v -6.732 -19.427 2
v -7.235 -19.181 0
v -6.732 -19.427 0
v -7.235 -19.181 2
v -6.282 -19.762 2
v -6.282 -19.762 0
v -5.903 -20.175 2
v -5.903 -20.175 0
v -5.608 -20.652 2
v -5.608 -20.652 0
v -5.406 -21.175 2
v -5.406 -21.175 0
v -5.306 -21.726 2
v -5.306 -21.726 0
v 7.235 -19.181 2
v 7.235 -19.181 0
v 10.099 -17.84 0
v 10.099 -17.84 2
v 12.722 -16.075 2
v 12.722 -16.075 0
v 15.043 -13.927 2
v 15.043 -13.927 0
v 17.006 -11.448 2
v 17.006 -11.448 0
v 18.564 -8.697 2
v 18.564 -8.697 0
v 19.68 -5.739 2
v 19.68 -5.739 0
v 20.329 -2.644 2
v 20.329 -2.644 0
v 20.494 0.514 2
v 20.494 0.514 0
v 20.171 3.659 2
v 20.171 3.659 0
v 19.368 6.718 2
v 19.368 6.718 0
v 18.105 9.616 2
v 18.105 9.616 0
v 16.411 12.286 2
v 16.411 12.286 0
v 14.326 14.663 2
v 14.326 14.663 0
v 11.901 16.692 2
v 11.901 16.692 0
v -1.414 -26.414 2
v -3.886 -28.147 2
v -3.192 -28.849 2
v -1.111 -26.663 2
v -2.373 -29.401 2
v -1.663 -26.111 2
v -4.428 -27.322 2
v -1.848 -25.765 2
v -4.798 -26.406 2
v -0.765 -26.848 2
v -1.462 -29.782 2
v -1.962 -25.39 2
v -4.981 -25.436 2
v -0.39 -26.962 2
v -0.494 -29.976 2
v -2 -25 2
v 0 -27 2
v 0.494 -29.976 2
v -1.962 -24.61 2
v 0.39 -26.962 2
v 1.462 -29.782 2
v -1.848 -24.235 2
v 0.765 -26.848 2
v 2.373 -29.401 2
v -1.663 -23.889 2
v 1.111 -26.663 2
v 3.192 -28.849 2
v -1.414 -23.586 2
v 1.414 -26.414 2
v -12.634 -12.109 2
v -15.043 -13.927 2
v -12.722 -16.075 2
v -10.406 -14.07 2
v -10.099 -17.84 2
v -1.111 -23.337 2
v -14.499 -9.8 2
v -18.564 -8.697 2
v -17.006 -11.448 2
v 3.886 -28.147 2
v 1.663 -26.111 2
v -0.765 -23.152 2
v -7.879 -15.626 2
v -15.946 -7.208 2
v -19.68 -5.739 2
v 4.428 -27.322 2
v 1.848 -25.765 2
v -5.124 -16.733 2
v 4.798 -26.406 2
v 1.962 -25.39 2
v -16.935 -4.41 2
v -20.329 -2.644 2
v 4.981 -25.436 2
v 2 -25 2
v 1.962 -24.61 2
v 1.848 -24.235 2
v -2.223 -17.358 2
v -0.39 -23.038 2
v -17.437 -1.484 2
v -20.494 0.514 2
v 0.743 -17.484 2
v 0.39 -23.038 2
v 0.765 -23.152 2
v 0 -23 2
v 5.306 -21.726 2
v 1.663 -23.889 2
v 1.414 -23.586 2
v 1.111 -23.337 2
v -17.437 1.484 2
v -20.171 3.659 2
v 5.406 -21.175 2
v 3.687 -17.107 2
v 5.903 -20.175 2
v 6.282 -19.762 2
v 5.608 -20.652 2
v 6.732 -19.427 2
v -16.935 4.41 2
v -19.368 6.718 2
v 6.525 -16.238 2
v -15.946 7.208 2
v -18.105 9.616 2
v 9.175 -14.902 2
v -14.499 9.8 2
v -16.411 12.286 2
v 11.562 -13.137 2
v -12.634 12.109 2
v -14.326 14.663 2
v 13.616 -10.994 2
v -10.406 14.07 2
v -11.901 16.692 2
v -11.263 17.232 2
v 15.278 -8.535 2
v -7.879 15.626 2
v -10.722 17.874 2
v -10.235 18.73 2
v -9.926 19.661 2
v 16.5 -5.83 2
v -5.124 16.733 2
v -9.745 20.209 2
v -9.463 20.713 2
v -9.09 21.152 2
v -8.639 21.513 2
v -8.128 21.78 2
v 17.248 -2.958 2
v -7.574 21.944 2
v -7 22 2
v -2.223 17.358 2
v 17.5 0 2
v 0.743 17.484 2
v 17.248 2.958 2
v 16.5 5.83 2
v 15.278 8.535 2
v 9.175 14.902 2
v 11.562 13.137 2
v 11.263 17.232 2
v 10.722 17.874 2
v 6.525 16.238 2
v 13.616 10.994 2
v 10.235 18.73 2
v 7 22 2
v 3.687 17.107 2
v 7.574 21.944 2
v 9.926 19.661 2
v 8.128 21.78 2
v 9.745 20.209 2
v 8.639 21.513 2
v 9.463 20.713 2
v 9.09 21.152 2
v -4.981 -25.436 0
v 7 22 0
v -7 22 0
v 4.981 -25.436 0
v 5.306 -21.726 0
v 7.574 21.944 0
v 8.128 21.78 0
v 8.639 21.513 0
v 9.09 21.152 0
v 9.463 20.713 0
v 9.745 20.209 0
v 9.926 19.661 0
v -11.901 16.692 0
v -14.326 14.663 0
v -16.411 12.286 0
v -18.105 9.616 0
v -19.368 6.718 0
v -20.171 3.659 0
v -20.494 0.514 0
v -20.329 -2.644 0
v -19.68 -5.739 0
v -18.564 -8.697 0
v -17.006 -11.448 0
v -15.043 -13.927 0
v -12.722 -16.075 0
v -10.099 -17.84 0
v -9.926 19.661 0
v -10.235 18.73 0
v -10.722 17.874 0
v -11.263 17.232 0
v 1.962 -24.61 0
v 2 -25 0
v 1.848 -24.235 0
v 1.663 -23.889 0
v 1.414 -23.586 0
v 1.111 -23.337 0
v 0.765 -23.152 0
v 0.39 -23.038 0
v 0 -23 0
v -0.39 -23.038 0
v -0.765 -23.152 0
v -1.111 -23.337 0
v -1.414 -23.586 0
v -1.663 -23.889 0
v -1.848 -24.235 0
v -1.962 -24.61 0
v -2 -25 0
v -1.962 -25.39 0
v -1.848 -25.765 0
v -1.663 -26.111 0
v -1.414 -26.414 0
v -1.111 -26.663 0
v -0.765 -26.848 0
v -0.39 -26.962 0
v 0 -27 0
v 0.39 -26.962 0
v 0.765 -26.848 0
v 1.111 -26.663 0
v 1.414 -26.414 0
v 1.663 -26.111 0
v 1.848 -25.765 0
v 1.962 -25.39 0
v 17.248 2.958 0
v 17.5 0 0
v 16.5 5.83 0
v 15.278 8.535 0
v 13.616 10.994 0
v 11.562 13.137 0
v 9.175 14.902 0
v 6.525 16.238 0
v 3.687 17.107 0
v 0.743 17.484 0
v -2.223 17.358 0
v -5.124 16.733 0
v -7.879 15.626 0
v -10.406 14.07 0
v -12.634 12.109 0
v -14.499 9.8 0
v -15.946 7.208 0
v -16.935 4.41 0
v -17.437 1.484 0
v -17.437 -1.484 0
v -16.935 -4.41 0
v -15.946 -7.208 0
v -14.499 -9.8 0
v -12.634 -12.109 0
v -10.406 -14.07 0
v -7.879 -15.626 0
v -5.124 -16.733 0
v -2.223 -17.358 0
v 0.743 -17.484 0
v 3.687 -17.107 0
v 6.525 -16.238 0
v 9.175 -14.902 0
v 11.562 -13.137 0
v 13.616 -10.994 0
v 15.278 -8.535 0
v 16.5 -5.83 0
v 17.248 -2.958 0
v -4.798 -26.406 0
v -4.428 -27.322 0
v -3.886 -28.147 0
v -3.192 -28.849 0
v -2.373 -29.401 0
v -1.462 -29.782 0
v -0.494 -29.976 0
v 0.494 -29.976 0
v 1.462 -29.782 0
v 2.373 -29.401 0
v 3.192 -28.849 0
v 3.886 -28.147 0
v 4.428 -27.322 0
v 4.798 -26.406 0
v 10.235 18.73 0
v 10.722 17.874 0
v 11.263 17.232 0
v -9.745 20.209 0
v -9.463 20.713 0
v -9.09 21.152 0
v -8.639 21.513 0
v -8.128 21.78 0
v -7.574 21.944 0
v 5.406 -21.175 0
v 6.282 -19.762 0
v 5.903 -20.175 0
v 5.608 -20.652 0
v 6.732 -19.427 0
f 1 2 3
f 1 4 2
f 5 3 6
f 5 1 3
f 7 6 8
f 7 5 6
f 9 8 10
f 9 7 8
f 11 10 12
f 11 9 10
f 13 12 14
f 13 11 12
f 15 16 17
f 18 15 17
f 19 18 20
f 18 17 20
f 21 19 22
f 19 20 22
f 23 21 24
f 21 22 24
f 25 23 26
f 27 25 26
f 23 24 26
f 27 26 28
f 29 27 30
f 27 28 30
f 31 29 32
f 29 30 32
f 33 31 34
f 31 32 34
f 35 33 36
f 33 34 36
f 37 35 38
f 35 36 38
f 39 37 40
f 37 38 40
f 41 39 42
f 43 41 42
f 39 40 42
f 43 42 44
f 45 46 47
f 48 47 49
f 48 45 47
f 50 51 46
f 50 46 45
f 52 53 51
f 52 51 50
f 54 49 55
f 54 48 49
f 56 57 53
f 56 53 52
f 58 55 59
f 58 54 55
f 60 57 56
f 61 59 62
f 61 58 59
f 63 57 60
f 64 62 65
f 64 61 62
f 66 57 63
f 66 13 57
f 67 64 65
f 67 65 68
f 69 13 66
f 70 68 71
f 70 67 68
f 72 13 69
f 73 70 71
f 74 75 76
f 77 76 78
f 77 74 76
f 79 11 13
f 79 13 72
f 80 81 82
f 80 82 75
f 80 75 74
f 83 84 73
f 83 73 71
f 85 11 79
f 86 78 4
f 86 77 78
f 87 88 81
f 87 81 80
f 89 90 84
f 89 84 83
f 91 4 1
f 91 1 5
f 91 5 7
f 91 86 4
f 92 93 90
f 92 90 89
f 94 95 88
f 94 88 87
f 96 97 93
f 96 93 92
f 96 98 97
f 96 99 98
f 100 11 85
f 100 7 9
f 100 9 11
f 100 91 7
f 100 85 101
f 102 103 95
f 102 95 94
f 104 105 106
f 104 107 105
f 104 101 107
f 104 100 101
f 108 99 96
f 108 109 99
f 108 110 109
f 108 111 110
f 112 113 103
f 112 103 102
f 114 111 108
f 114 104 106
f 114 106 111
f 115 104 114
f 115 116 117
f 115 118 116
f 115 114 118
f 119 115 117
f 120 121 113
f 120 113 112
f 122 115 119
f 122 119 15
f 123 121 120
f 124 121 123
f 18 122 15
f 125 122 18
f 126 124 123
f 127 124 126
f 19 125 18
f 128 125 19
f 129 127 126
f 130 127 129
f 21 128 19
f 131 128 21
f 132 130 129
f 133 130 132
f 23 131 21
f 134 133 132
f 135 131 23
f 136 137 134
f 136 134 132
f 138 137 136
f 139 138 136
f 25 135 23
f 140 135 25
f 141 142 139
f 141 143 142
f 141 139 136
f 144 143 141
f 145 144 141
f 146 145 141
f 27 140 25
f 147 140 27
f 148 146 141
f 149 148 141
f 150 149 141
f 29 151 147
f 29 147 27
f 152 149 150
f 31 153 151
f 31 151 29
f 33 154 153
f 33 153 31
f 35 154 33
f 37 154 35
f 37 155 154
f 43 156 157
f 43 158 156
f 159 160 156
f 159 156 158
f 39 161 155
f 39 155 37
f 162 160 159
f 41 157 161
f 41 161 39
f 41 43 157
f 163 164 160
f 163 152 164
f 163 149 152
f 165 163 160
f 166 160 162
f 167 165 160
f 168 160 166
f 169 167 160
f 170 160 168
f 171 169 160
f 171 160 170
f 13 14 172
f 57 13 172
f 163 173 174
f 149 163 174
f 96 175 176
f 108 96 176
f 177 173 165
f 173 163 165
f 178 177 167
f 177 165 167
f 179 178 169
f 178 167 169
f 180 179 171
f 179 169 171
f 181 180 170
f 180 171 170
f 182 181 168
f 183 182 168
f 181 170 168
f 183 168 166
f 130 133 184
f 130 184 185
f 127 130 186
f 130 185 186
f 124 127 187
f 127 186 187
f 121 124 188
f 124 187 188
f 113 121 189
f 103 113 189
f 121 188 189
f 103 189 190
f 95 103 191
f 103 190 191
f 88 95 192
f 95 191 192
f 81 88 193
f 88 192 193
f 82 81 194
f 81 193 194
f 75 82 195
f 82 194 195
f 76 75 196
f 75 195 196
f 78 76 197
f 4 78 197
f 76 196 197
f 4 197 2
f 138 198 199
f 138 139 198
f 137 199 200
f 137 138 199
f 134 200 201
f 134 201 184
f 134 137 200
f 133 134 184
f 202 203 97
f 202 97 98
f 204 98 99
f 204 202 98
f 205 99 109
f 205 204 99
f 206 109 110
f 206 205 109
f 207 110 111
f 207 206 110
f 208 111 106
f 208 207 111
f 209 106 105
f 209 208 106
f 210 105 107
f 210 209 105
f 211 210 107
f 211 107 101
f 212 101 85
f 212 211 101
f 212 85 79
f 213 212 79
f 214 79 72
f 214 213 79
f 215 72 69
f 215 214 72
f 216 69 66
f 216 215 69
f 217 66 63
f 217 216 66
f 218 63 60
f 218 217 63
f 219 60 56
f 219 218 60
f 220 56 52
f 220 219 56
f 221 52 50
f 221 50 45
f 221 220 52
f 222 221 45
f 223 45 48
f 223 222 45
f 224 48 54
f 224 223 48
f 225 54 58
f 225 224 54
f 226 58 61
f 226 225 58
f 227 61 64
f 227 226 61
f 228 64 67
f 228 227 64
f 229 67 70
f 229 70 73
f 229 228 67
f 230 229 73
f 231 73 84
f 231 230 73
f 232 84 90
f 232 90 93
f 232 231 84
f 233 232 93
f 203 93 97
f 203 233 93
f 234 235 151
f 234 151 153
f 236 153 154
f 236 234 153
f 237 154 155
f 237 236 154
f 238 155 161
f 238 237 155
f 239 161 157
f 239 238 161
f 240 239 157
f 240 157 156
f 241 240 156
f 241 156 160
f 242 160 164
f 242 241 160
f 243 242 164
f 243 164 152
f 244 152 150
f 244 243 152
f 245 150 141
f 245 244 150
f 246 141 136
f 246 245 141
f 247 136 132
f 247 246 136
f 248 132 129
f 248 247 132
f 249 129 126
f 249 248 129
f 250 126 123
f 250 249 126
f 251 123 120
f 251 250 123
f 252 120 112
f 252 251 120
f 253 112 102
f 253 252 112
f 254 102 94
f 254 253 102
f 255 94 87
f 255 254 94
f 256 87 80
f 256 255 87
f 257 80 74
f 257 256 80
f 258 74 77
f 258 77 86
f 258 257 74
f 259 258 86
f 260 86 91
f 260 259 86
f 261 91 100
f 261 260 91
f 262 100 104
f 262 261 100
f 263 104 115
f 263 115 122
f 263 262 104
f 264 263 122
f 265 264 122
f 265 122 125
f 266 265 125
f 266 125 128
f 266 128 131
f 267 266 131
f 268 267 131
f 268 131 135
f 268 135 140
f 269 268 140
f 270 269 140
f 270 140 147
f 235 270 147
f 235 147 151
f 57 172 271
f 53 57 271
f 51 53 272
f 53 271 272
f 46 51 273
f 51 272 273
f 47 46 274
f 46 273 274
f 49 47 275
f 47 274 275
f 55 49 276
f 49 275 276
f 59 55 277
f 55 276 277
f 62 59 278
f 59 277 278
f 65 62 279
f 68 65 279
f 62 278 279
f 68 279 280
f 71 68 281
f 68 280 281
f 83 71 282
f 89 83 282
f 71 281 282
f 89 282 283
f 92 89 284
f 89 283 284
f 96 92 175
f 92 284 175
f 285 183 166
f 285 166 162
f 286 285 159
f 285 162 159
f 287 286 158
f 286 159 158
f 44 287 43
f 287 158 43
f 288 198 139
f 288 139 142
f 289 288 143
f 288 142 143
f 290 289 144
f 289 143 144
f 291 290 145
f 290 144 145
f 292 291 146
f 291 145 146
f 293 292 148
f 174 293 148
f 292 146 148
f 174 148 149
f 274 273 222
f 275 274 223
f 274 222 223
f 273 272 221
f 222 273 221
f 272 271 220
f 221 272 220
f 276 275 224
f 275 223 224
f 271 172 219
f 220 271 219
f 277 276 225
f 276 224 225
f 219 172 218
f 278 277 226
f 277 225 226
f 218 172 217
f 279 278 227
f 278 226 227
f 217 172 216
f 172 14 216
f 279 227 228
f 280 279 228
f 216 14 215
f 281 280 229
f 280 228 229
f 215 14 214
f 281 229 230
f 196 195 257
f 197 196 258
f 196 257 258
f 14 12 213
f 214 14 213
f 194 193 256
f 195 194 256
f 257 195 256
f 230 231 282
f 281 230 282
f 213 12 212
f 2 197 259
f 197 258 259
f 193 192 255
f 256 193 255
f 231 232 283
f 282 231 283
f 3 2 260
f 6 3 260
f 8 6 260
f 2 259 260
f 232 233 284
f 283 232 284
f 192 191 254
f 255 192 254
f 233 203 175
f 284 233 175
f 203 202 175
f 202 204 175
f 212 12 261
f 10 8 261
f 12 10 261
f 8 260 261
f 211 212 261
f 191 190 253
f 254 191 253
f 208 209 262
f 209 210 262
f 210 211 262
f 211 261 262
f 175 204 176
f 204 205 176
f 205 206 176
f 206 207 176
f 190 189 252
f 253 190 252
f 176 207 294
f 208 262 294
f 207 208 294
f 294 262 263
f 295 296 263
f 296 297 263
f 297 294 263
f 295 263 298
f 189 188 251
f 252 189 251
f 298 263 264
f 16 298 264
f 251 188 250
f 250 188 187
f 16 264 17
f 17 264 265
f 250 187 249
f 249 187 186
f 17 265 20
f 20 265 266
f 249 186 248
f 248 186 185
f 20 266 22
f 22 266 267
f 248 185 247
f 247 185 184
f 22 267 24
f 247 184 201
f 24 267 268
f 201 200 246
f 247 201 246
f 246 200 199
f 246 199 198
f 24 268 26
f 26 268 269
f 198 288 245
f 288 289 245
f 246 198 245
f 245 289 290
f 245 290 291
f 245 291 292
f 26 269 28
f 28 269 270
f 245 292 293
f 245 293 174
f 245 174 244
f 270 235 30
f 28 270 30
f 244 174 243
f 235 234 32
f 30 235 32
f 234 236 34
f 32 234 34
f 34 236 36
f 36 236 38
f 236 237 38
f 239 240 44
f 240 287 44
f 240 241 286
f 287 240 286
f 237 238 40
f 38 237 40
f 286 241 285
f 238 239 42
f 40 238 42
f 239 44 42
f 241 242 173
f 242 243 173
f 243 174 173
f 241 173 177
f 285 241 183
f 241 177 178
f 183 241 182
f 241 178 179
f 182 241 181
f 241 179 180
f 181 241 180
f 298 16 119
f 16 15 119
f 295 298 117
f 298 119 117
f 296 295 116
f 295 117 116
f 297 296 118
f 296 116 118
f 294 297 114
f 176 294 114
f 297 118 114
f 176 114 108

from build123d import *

# Parameters (mm, degrees)
F0_R     = 2
F0_R_2   = 17.5
F1_DEPTH = 2
F2_R     = 3
F3_R     = 5


with BuildPart() as f1:
    # F0 (on Top) → F1 (new body)
    with BuildSketch(Plane.XY):
        with BuildLine():
            Line((-10, 22), (-10, 17.89553))
            ThreePointArc((-10, 17.89553), (-20.353721, -2.444595), (-5.478019, -19.754526))
            Line((-5.478019, -19.754526), (-4.980973, -25.435779))
            ThreePointArc((-4.980973, -25.435779), (0, -30), (4.980973, -25.435779))
            Line((4.980973, -25.435779), (5.478019, -19.754526))
            ThreePointArc((5.478019, -19.754526), (20.353721, -2.444595), (10, 17.89553))
            Line((10, 17.89553), (10, 22))
            Line((10, 22), (-10, 22))
        make_face()
        with Locations((0, -25)):
            Circle(F0_R, mode=Mode.SUBTRACT)
        Circle(F0_R_2, mode=Mode.SUBTRACT)
    extrude(amount=F1_DEPTH)

    # F2
    f2_edges = [f1.edges().sort_by_distance(p)[0] for p in [
        (-10, 22, 1),
        (10, 22, 1),
        (-5.478019, -19.754526, 1),
        (5.478019, -19.754526, 1),
    ]]
    fillet(f2_edges, radius=F2_R)

    # F3
    f3_edges = [f1.edges().sort_by_distance(p)[0] for p in [
        (-10, 17.89553, 1),
        (10, 17.89553, 1),
    ]]
    fillet(f3_edges, radius=F3_R)


solid = f1.part
